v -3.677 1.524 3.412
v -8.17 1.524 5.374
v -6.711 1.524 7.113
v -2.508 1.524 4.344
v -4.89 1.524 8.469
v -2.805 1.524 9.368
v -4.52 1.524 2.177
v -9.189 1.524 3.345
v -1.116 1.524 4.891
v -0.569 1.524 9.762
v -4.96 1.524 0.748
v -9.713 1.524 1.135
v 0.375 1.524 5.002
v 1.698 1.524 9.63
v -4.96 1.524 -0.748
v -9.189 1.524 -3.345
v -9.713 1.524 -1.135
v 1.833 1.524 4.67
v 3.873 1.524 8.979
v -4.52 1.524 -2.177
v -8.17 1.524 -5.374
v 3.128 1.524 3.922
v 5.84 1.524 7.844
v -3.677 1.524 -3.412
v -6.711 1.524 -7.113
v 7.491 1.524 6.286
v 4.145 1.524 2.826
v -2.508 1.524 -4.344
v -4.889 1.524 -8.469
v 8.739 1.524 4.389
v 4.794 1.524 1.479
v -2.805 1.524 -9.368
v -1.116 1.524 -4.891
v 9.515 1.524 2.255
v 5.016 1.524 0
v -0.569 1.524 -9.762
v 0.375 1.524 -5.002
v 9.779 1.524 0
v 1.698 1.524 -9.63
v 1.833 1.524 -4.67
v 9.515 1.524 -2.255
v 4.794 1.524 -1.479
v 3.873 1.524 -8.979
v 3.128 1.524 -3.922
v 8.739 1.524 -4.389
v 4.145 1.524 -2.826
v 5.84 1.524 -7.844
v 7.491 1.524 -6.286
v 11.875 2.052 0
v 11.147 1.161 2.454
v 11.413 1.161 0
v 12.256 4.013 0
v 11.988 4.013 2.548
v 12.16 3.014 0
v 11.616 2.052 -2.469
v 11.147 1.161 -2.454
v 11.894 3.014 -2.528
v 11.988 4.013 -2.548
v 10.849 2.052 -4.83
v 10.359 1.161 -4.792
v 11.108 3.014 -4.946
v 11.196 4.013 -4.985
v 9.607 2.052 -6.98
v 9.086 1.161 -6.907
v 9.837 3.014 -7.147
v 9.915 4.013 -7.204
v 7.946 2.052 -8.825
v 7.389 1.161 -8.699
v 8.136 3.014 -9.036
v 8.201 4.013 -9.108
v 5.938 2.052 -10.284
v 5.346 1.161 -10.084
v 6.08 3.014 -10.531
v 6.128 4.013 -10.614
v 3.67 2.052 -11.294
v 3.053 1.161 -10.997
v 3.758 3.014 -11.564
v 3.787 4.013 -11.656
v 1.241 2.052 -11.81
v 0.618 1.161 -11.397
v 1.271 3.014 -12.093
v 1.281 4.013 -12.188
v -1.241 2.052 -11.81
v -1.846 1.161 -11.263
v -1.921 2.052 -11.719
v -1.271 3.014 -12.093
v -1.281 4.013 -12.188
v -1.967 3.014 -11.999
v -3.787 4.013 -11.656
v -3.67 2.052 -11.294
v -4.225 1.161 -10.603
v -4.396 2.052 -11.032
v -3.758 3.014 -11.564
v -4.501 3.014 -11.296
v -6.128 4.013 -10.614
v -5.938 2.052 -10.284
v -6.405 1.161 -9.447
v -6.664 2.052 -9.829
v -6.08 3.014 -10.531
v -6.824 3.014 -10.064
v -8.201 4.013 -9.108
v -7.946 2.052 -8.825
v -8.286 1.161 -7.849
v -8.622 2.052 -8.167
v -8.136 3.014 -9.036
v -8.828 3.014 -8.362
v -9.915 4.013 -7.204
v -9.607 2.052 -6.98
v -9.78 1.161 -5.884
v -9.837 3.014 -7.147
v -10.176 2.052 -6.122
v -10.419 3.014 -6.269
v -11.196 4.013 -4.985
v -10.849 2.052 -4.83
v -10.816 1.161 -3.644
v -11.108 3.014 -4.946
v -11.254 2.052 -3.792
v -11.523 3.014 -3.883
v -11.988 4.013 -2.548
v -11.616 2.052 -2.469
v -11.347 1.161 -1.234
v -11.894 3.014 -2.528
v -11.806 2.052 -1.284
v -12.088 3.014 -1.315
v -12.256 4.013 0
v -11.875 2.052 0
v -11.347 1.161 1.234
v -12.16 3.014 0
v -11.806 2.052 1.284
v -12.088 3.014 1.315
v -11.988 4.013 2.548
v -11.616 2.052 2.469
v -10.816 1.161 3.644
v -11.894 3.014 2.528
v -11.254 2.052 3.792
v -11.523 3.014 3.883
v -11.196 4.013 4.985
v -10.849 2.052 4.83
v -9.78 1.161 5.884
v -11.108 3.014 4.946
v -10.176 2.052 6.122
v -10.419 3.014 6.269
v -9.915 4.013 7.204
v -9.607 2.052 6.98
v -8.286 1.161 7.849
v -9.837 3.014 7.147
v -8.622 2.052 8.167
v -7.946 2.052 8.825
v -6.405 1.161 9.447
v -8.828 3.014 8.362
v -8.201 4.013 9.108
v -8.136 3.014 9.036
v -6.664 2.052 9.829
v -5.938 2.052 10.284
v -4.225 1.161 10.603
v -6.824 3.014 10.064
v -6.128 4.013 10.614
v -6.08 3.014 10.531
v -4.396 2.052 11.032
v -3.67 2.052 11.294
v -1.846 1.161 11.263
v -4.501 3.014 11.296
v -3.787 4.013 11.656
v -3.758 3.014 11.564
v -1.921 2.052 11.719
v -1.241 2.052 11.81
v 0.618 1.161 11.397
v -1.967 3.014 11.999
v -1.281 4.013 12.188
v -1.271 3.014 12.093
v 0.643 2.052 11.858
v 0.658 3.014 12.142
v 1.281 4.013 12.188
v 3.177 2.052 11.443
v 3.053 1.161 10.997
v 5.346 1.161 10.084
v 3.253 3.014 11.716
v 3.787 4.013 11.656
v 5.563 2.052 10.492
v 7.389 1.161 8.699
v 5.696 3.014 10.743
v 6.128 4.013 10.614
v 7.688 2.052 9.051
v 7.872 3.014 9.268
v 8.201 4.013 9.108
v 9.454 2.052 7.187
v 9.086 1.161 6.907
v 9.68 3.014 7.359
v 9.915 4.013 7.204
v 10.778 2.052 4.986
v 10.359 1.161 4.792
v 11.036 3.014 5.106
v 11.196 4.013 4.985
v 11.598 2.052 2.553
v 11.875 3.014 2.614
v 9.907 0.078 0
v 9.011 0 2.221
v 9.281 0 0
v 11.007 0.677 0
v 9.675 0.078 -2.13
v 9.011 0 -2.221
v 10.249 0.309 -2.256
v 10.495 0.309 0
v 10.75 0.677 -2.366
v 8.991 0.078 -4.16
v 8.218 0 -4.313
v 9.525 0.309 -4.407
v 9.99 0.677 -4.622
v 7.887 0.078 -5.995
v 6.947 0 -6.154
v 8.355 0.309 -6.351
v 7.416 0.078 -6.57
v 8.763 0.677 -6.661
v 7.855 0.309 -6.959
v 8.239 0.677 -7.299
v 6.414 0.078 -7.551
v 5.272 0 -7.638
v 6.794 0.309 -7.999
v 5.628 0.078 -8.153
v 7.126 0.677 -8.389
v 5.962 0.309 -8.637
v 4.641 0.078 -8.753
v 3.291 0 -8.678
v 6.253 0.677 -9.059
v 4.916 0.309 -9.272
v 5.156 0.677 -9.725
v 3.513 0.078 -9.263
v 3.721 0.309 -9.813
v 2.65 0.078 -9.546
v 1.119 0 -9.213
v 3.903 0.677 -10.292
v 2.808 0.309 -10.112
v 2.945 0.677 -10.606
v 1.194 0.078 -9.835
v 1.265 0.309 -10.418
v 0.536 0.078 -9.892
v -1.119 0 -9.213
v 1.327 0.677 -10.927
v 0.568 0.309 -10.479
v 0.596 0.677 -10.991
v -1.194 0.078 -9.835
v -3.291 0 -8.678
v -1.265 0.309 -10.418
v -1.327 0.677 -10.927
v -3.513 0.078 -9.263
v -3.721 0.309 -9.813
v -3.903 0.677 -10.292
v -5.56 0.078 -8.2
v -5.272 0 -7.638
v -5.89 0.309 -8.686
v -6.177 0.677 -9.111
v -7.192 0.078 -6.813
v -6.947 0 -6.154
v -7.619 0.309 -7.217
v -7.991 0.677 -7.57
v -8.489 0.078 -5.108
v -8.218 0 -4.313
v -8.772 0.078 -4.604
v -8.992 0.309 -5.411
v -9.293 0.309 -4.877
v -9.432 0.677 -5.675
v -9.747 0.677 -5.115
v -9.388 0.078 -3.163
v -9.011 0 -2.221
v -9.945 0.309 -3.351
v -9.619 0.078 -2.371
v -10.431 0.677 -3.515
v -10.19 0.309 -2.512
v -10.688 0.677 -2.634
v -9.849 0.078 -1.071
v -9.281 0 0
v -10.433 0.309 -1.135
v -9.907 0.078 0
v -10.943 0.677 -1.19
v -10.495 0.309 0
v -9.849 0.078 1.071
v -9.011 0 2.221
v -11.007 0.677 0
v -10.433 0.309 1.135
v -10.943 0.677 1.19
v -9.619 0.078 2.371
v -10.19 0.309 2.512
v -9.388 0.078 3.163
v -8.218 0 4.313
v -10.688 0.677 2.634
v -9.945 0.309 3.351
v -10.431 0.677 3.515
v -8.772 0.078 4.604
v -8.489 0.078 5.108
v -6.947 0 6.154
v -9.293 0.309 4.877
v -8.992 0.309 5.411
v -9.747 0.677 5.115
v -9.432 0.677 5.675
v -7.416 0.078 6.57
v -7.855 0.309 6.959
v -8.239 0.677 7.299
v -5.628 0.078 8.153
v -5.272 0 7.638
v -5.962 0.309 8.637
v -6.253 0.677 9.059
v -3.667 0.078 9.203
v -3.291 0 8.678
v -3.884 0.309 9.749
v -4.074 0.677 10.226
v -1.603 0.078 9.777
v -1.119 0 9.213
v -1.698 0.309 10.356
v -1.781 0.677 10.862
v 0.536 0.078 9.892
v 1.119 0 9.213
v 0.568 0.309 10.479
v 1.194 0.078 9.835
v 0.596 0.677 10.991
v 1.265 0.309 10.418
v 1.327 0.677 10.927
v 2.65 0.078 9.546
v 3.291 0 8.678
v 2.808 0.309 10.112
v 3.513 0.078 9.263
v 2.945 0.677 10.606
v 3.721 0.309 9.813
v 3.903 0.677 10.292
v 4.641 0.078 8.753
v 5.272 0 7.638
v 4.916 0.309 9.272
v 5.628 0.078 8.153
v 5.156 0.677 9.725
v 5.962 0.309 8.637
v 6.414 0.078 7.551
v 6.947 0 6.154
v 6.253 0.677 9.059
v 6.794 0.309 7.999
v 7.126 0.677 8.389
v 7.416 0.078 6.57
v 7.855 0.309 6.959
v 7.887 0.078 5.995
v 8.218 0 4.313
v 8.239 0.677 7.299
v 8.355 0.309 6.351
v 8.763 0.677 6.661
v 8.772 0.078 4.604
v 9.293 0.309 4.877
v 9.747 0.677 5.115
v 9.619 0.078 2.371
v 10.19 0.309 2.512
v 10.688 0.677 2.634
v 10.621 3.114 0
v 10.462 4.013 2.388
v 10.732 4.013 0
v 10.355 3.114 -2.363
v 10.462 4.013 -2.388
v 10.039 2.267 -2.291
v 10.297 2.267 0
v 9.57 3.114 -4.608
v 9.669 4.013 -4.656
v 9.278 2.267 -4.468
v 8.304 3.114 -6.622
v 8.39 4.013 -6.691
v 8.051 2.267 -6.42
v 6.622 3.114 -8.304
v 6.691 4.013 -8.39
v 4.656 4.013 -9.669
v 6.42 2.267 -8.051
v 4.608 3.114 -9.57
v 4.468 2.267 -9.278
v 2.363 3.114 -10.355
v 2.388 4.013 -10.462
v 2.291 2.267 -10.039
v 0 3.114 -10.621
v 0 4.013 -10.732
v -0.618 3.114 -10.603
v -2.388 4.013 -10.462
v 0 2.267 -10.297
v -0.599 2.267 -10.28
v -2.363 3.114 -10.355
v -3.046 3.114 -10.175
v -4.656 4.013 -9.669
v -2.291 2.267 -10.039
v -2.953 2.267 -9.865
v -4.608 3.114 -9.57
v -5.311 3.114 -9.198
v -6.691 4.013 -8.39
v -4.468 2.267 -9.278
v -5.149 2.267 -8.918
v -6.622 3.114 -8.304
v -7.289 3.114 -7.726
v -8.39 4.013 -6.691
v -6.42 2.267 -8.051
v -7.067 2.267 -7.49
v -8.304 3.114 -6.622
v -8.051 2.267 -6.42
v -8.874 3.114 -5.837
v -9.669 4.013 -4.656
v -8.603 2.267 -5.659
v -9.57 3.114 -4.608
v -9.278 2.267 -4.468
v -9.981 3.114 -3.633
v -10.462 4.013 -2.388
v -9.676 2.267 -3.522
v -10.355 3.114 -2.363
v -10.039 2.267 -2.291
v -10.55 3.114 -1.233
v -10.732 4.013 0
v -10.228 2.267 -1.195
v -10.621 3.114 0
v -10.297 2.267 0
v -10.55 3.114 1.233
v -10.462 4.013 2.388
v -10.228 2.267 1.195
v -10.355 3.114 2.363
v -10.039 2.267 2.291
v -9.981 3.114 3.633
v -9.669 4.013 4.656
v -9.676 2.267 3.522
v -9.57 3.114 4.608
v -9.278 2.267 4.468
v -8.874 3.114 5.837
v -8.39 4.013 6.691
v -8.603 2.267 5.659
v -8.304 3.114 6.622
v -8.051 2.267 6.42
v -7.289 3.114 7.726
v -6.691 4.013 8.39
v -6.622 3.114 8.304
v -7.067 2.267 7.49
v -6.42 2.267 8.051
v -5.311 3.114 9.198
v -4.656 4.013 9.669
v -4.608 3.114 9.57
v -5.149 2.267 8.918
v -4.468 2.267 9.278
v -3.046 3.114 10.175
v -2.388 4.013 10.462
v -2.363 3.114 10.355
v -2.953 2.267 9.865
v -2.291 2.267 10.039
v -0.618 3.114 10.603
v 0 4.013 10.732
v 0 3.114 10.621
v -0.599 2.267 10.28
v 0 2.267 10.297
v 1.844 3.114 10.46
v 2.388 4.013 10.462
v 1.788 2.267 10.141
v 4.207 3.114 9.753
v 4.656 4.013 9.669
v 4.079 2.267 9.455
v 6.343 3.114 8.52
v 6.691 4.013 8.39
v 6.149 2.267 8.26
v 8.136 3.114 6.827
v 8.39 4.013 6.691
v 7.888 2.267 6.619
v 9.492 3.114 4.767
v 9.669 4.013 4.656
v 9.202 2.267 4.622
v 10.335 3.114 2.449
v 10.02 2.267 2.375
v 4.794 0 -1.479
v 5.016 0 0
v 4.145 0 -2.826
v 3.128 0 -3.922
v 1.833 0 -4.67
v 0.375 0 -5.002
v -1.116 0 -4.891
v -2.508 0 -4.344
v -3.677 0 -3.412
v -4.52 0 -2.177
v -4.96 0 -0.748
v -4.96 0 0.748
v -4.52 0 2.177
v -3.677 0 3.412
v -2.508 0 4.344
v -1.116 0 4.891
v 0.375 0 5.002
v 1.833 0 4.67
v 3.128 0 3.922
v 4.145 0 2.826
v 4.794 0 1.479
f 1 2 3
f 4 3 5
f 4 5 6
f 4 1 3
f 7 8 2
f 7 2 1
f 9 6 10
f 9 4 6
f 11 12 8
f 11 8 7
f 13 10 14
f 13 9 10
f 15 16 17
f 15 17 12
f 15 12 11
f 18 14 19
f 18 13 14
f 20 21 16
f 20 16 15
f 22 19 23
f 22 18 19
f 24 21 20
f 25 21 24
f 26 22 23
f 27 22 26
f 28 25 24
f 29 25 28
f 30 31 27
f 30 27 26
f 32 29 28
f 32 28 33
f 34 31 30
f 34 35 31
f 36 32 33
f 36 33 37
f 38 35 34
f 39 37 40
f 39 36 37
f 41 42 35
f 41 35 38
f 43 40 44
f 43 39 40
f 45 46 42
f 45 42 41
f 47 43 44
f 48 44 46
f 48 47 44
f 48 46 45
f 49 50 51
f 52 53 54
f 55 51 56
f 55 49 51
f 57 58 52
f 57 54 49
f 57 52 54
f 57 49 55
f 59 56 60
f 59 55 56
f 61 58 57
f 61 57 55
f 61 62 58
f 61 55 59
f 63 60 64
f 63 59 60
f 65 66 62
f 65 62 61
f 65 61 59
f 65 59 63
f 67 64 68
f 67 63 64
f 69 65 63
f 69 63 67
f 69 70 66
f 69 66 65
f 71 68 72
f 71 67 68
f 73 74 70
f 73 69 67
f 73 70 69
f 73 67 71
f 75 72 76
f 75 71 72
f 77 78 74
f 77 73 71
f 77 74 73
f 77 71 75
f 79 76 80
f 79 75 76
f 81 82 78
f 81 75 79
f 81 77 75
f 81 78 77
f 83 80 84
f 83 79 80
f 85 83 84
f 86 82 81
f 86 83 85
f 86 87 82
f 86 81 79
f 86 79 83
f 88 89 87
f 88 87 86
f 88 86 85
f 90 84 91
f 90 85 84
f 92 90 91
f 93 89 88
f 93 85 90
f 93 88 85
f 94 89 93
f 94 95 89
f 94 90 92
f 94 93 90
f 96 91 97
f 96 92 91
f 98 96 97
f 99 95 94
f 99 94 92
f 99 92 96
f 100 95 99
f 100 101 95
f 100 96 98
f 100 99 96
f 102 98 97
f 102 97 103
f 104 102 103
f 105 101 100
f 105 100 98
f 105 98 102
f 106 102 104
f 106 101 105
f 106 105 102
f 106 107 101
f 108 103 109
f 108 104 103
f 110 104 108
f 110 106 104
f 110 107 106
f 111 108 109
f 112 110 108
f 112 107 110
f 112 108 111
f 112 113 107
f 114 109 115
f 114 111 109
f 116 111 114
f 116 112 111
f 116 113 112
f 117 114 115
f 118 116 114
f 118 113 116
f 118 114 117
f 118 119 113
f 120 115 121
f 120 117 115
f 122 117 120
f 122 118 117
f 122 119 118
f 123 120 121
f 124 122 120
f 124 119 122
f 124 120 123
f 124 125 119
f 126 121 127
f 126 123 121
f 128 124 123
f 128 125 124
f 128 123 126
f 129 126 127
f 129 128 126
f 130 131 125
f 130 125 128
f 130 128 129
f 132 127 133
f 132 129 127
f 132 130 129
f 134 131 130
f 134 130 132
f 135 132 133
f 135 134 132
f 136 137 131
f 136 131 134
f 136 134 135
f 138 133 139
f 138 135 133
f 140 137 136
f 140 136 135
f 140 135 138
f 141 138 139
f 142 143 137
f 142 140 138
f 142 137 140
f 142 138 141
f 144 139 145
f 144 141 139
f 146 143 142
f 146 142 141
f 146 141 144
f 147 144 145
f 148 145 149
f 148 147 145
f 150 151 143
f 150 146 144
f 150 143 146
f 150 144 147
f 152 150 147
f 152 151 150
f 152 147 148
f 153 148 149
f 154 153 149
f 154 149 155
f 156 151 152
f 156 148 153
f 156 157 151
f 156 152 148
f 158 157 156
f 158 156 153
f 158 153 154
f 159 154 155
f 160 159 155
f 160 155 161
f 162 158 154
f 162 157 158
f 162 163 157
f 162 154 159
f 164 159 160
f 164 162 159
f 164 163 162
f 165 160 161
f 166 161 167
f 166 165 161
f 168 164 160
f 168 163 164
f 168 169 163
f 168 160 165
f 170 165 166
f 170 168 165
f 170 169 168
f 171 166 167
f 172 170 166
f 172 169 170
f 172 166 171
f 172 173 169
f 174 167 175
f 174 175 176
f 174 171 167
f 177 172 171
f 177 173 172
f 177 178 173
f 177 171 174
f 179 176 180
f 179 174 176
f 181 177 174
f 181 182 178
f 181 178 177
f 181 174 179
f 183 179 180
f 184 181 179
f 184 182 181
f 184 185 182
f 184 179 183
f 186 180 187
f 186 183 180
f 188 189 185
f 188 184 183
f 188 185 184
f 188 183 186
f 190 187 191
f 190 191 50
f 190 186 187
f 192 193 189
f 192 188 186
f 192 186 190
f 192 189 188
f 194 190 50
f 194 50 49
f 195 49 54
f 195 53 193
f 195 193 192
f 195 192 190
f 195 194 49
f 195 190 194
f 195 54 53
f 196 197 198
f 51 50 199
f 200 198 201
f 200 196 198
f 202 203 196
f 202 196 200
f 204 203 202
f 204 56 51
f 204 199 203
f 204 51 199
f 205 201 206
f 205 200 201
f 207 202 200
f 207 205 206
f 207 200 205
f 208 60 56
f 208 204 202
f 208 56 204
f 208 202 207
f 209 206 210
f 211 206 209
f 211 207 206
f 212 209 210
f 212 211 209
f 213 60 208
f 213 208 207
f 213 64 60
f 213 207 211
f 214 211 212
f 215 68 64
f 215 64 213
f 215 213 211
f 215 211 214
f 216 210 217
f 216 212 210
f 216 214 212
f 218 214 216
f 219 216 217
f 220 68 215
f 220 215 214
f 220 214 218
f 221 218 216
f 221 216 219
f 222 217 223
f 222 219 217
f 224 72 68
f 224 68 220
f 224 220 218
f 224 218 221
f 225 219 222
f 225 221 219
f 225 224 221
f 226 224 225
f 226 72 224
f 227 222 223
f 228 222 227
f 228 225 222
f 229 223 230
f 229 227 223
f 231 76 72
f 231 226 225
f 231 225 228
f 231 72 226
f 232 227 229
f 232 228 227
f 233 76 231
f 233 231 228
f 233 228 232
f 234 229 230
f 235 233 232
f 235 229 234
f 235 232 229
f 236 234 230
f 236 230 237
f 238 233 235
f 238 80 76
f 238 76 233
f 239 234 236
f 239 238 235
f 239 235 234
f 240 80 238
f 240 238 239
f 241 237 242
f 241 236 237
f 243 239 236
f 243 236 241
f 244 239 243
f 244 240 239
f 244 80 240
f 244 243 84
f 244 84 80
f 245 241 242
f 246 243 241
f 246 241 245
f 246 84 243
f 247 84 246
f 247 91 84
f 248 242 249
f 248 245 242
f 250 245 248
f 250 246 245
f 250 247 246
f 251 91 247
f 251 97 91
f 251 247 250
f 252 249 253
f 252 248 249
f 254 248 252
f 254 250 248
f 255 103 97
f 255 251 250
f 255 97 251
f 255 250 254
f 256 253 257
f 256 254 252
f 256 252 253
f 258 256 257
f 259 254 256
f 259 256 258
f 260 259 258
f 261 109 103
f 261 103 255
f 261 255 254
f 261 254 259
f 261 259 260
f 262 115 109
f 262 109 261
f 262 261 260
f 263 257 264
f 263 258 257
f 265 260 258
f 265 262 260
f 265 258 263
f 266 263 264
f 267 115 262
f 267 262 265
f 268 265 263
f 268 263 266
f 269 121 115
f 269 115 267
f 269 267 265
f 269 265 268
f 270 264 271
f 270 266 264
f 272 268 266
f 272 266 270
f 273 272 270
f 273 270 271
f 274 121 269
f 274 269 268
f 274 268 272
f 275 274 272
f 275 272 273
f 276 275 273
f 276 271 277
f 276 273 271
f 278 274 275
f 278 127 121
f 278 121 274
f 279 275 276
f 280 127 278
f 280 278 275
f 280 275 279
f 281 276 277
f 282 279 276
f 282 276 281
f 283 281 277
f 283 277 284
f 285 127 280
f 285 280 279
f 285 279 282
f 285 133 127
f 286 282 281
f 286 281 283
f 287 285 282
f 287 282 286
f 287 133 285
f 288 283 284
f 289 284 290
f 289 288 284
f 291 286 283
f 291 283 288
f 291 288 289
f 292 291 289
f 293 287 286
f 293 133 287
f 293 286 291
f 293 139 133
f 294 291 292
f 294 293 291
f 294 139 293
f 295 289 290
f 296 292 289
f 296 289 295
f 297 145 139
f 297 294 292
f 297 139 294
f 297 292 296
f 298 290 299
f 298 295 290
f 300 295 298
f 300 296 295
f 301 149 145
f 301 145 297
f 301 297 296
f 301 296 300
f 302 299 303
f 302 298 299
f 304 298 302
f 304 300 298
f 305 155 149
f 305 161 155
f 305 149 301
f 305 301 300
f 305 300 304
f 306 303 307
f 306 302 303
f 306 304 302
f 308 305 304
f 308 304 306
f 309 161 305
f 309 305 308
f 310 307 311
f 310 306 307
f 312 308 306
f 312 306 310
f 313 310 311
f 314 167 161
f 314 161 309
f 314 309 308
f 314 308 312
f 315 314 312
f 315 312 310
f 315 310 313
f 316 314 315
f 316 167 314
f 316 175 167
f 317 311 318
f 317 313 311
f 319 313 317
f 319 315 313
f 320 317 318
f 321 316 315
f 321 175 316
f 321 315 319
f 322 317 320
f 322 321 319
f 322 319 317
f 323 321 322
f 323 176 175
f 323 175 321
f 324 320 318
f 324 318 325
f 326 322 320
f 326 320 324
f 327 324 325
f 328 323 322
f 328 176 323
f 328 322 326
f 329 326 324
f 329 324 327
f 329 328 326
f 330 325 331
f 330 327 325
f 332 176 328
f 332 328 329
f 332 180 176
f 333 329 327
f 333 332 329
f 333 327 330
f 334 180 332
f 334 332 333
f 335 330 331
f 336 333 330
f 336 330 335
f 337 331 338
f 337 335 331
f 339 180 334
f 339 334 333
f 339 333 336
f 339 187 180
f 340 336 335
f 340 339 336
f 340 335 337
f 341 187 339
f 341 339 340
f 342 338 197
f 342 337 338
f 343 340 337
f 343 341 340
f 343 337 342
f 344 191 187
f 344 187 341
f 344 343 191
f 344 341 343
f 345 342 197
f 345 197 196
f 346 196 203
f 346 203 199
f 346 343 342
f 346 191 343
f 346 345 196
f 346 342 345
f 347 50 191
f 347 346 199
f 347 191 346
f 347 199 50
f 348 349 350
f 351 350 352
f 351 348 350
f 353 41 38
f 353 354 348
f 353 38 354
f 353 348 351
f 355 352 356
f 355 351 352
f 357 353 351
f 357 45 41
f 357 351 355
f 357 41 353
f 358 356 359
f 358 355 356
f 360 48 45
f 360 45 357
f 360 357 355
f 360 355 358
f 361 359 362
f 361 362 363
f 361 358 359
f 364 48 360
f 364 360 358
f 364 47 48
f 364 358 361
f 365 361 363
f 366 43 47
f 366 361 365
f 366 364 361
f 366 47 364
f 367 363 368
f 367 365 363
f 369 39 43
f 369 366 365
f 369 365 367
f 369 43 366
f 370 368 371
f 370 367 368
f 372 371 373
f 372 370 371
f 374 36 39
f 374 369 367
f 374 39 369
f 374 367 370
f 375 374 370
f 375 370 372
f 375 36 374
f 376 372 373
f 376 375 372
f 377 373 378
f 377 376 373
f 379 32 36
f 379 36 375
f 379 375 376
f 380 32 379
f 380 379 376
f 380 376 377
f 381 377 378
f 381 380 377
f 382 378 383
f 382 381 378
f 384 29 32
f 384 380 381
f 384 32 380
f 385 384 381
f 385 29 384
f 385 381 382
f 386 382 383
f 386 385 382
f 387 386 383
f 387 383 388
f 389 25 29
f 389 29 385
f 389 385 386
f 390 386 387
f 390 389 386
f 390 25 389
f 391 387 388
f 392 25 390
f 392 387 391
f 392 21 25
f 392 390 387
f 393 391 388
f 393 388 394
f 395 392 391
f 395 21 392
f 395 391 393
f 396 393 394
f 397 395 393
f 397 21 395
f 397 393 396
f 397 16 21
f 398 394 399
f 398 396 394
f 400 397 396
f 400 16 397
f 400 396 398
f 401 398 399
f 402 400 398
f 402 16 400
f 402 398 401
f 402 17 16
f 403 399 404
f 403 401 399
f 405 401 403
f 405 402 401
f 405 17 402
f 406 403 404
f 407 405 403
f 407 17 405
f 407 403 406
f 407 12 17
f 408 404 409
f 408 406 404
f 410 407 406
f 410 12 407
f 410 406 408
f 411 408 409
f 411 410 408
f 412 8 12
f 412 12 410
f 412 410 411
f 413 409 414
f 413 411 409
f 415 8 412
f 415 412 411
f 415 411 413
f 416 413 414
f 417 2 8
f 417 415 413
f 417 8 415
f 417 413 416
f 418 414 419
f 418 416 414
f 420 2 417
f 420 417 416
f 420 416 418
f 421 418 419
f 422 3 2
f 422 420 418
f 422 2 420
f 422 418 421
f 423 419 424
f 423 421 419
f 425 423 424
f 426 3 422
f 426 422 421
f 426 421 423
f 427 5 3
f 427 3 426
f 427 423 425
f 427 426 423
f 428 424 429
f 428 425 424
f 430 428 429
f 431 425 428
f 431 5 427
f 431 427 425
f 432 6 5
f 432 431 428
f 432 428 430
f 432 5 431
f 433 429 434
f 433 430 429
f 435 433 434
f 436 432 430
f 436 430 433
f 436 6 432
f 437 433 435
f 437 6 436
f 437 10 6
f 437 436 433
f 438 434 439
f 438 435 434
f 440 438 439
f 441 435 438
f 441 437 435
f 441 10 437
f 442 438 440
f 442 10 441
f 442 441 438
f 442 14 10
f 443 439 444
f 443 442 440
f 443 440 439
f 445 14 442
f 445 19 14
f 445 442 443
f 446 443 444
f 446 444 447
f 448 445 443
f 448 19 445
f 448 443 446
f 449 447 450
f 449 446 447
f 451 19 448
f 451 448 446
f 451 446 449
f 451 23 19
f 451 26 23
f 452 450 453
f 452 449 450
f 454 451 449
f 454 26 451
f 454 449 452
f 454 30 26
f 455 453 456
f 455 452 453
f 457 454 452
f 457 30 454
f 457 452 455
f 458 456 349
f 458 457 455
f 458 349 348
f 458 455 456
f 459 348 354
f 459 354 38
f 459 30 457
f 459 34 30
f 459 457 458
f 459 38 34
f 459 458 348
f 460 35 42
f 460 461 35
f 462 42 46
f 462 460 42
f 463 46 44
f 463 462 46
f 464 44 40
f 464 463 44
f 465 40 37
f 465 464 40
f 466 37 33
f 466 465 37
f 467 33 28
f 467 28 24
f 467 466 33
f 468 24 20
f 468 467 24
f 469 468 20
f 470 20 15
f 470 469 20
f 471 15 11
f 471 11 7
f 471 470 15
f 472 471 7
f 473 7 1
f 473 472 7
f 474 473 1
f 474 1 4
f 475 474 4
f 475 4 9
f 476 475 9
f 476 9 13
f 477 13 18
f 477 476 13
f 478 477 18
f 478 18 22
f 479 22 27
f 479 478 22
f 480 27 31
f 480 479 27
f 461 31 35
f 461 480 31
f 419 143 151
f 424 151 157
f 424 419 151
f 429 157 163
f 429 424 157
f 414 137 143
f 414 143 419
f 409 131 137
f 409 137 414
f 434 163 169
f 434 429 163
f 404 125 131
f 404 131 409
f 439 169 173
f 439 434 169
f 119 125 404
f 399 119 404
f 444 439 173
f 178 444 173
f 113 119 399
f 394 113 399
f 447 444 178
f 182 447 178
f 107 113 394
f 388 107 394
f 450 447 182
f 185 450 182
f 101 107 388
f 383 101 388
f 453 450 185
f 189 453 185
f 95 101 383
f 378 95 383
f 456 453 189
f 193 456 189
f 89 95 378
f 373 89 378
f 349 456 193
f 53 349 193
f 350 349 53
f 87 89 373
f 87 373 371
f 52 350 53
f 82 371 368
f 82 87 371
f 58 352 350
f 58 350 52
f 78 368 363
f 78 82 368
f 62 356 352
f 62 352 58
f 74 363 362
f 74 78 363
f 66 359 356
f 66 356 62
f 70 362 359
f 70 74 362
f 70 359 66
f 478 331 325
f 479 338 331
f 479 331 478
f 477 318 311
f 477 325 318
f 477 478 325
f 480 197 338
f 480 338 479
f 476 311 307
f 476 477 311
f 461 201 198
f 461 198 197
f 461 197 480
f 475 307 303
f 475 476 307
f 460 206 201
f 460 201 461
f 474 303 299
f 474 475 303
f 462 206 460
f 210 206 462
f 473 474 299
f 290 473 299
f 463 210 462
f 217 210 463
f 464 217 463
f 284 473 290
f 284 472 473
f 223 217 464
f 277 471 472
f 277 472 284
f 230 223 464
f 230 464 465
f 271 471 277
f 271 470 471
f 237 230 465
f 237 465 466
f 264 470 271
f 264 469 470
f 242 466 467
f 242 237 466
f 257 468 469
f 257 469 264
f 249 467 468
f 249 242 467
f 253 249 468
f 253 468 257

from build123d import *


with BuildPart() as part:
    # Sketch1 → Revolve1 (revolve)
    with BuildSketch(Plane.XY):
        with BuildLine():
            Line((5.0165, 0), (9.280631004, 0))
            ThreePointArc((9.280631004, 0), (10.494721496, 0.308949961), (11.413463004, 1.160642302))
            ThreePointArc((11.413463004, 1.160642302), (12.040594592, 2.526079315), (12.2555, 4.0132))
            Line((12.2555, 4.0132), (10.7315, 4.0132))
            ThreePointArc((10.7315, 4.0132), (10.485243398, 2.680592322), (9.779, 1.524))
            Line((9.779, 1.524), (5.0165, 1.524))
            Line((5.0165, 1.524), (5.0165, 0))
        make_face()
    revolve(axis=Axis((0, 0, 0), (0, 1, 0)))


solid = part.part
